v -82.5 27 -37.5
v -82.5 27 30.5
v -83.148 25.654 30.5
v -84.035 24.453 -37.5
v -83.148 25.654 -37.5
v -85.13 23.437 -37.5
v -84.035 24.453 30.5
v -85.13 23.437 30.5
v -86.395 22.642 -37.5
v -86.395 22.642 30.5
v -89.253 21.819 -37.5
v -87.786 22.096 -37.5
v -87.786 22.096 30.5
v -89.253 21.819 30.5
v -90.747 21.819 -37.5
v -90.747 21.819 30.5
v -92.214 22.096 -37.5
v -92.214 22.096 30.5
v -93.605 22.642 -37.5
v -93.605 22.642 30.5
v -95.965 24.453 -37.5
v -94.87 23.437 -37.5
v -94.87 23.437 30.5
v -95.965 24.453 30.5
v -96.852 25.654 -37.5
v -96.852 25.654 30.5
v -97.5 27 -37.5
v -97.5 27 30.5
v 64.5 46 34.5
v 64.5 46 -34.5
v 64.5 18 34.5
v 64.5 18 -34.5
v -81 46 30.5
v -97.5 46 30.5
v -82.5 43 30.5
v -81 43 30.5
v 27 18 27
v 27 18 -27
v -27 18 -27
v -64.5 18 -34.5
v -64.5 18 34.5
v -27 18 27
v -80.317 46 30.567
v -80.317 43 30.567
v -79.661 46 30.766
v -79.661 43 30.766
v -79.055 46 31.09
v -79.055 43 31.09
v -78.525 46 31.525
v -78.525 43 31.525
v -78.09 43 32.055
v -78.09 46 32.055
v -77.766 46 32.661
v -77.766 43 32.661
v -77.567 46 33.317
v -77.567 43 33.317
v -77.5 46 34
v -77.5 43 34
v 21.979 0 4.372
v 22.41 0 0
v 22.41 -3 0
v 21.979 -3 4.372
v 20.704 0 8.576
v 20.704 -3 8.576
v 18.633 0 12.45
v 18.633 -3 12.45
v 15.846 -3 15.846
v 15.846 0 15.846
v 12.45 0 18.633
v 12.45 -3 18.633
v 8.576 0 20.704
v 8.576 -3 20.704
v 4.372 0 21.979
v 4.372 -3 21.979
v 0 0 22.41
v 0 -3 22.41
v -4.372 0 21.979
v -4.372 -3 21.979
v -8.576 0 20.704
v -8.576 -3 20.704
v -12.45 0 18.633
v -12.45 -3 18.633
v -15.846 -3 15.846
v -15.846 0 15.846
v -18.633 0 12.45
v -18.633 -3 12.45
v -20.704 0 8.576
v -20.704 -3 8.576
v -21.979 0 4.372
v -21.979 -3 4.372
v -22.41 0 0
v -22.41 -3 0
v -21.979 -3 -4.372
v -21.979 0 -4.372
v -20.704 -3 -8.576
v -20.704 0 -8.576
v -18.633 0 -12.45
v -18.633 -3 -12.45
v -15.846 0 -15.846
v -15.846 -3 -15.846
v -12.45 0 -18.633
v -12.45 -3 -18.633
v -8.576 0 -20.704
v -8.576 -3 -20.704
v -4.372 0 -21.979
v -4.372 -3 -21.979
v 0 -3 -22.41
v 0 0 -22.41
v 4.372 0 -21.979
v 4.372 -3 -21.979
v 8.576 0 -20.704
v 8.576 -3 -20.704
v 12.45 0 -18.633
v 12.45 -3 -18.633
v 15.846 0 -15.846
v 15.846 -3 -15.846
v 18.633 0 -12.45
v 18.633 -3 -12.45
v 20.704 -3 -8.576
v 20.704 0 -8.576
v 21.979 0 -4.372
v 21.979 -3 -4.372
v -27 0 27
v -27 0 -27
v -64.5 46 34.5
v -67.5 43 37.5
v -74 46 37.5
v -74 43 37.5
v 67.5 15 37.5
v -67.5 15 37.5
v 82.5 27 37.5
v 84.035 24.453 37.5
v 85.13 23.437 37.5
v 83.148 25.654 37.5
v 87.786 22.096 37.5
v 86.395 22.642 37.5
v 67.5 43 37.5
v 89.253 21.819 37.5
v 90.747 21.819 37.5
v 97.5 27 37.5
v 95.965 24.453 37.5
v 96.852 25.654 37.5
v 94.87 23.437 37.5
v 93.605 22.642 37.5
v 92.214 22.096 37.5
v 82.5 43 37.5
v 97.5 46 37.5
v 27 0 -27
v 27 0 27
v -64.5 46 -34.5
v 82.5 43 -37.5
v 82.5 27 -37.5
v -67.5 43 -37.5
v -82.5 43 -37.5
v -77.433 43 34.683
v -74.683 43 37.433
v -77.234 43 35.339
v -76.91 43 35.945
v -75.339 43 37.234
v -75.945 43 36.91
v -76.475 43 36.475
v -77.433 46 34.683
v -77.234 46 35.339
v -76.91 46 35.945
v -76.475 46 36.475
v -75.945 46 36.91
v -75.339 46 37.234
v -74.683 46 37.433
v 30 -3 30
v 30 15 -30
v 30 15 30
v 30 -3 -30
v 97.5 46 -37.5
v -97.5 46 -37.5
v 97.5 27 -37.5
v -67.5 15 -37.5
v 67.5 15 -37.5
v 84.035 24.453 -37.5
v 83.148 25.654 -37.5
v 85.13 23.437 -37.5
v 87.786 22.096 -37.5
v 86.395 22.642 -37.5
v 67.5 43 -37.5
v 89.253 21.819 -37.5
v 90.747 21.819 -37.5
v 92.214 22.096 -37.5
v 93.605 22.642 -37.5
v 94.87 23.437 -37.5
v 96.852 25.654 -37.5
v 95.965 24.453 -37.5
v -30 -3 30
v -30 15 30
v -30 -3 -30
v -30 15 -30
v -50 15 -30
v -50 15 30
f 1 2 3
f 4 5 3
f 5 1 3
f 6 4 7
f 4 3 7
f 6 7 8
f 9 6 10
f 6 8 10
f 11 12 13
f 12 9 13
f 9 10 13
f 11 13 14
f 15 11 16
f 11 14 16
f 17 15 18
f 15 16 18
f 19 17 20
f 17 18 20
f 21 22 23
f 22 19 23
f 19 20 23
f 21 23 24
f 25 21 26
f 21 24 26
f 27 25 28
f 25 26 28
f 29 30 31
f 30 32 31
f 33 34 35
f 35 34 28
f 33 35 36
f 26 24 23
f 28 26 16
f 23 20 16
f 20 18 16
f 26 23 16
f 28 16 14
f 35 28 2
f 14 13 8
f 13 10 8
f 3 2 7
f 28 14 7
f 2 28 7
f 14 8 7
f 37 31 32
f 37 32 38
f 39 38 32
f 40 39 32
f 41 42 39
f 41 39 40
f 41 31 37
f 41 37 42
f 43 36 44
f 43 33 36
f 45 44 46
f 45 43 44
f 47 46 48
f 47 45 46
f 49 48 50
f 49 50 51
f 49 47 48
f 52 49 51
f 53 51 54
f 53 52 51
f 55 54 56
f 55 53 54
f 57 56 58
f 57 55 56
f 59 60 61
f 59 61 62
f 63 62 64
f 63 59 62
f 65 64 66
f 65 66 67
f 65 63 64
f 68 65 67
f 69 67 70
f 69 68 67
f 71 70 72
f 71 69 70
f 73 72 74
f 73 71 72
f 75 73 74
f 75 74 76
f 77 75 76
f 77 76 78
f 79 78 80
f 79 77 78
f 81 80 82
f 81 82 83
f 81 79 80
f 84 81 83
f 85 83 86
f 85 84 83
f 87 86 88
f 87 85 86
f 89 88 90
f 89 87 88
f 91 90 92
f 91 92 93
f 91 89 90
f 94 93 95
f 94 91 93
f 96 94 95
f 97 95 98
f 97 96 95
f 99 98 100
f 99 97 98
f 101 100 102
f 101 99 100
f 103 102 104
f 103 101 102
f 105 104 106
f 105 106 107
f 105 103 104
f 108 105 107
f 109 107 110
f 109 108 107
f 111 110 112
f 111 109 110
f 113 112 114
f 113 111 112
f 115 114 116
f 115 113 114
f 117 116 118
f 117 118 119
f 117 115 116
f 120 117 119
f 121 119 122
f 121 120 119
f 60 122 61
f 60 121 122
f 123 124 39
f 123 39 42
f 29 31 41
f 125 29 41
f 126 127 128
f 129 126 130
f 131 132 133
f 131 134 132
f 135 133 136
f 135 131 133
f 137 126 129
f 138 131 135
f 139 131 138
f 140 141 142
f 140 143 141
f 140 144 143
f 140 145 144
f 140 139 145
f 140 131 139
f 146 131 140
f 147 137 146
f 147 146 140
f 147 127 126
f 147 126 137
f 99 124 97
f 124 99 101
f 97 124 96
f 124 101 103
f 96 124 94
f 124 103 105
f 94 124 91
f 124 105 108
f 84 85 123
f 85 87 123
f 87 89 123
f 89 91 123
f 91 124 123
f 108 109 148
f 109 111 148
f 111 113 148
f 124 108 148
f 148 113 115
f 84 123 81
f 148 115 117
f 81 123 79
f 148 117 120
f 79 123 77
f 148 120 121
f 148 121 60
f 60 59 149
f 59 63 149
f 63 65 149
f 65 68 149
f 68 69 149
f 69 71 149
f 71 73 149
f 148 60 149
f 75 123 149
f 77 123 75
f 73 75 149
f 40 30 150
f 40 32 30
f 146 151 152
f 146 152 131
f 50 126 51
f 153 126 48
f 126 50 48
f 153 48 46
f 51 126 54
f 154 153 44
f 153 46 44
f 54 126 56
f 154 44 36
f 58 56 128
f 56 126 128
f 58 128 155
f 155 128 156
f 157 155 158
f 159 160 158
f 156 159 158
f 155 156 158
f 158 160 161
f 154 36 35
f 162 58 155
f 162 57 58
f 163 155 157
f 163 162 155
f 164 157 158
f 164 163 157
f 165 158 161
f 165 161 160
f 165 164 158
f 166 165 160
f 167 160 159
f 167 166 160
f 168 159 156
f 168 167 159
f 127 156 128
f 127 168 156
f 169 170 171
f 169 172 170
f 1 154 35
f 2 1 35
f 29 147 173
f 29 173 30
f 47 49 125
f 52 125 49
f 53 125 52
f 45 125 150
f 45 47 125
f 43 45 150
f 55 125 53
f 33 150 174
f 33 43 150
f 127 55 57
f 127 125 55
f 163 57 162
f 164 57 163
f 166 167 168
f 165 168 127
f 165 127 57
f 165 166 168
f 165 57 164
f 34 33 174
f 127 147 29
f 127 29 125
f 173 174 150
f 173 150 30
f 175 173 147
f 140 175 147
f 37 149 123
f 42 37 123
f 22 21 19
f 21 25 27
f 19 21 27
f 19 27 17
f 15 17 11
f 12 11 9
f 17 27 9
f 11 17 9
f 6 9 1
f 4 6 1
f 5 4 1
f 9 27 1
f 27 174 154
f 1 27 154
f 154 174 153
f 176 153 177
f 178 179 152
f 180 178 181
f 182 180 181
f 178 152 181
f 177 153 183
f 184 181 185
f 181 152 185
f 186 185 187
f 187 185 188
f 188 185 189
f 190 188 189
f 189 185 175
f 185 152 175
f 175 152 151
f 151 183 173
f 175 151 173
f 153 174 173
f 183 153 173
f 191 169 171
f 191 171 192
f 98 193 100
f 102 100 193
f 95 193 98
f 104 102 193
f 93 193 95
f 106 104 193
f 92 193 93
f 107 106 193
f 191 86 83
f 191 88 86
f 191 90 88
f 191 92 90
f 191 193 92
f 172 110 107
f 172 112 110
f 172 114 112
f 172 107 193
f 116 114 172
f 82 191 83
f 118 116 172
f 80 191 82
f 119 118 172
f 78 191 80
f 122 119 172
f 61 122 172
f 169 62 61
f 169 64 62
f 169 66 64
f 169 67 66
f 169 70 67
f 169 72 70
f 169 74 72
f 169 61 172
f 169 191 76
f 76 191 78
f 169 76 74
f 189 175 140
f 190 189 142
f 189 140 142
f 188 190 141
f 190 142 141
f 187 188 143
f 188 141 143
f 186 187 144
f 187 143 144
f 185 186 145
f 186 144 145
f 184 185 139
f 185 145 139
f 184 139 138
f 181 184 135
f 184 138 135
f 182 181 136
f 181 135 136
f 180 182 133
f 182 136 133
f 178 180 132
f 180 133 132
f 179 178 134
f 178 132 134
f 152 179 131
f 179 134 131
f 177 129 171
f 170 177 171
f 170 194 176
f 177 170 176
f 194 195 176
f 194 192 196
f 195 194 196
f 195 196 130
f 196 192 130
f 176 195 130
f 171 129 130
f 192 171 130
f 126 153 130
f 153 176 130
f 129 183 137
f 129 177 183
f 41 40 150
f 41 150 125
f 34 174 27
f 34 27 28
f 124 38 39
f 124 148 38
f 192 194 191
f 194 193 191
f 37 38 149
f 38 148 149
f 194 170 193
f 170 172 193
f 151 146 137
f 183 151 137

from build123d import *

# Parameters (mm, degrees)
F0_W      = 60
F0_H      = 60
F0_R      = 22.4096796893
F1_DEPTH  = 3
F2_W      = 60
F2_H      = 60
F2_W_2    = 54
F2_H_2    = 54
F3_DEPTH  = 15
F4_W      = 135
F4_H      = 75
F4_W_2    = 54
F4_H_2    = 54
F5_DEPTH  = 3
F6_W      = 135
F6_H      = 75
F6_W_2    = 129
F6_H_2    = 69
F7_DEPTH  = 25
F8_W      = 195
F8_H      = 75
F8_W_2    = 129
F8_H_2    = 69
F9_DEPTH  = 3
F10_W     = 15
F10_H     = 68
F11_DEPTH = 25
F12_W     = 15
F12_H     = 75
F13_DEPTH = 25
F15_DEPTH = 200
F17_DEPTH = 25
F18_R     = 3.49999
F21_DEPTH = 60


# Not quite as in the source:
# - a fillet or chamfer is up to 0.001 mm smaller than in the source, because OpenCascade refuses the exact size


with BuildPart() as f1:
    # F0 (on Front) → F1 (new body)
    with BuildSketch(Plane.XZ):
        Rectangle(F0_W, F0_H)
        Circle(F0_R, mode=Mode.SUBTRACT)
    extrude(amount=F1_DEPTH)

    # F2 (on face) → F3 (join)
    with BuildSketch(Plane(origin=(0, 0, 0), x_dir=(-1, 0, 0), z_dir=(0, 1, 0))):
        Rectangle(F2_W, F2_H)
        Rectangle(F2_W_2, F2_H_2, mode=Mode.SUBTRACT)
    extrude(amount=F3_DEPTH)

    # F4 (on face) → F5 (join)
    with BuildSketch(Plane(origin=(0, 15, 0), x_dir=(-1, 0, 0), z_dir=(0, 1, 0))):
        Rectangle(F4_W, F4_H)
        Rectangle(F4_W_2, F4_H_2, mode=Mode.SUBTRACT)
    extrude(amount=F5_DEPTH)

    # F6 (on face) → F7 (join)
    with BuildSketch(Plane(origin=(0, 18, 0), x_dir=(-1, 0, 0), z_dir=(0, 1, 0))):
        Rectangle(F6_W, F6_H)
        Rectangle(F6_W_2, F6_H_2, mode=Mode.SUBTRACT)
    extrude(amount=F7_DEPTH)

    # F8 (on face) → F9 (join)
    with BuildSketch(Plane(origin=(0, 43, 0), x_dir=(-1, 0, 0), z_dir=(0, 1, 0))):
        Rectangle(F8_W, F8_H)
        Rectangle(F8_W_2, F8_H_2, mode=Mode.SUBTRACT)
    extrude(amount=F9_DEPTH)

    # F10 (on face) → F11 (join)
    with BuildSketch(Plane.XZ.offset(-43)):
        with Locations((-90, -3.5)):
            Rectangle(F10_W, F10_H)
    extrude(amount=F11_DEPTH)

    # F12 (on face) → F13 (join)
    with BuildSketch(Plane.XZ.offset(-43)):
        with Locations((90, 0)):
            Rectangle(F12_W, F12_H)
    extrude(amount=F13_DEPTH)

    # F14 (on face) → F15 (cut)
    with BuildSketch(Plane.XY.offset(37.5)):
        with BuildLine():
            ThreePointArc((-82.5, 27), (-90, 21.7838821814), (-97.5, 27))
            Line((-97.5, 27), (-97.5, 18))
            Line((-97.5, 18), (-82.5, 18))
            Line((-82.5, 18), (-82.5, 27))
        make_face()
        with BuildLine():
            ThreePointArc((97.5, 27), (90, 21.7838821814), (82.5, 27))
            Line((82.5, 27), (82.5, 18))
            Line((82.5, 18), (97.5, 18))
            Line((97.5, 18), (97.5, 27))
        make_face()
    extrude(amount=-F15_DEPTH, mode=Mode.SUBTRACT)

    # F16 (on face) → F17 (cut)
    with BuildSketch(Plane.XZ.offset(-43)):
        Polygon((-77.5, 37.5), (-82.5, 37.5), (-97.5, 37.5), (-97.5, 30.5), (-82.5, 30.5), (-77.5, 30.5), align=None)
    extrude(amount=-F17_DEPTH, mode=Mode.SUBTRACT)

    # F18 (radius 3.5 in the source; OpenCascade refuses exactly that, so slightly less here)
    f18_edges = [f1.edges().sort_by_distance(p)[0] for p in [
        (-77.5, 44.5, 30.5),
        (-77.5, 44.5, 37.5),
    ]]
    fillet(f18_edges, radius=F18_R)

    # F20 (on face) → F21 (cut)
    with BuildSketch(Plane.XY.offset(30)):
        Polygon((-30, -3), (-50, 15), (-50, -3), align=None)
    extrude(amount=-F21_DEPTH, mode=Mode.SUBTRACT)


solid = f1.part
